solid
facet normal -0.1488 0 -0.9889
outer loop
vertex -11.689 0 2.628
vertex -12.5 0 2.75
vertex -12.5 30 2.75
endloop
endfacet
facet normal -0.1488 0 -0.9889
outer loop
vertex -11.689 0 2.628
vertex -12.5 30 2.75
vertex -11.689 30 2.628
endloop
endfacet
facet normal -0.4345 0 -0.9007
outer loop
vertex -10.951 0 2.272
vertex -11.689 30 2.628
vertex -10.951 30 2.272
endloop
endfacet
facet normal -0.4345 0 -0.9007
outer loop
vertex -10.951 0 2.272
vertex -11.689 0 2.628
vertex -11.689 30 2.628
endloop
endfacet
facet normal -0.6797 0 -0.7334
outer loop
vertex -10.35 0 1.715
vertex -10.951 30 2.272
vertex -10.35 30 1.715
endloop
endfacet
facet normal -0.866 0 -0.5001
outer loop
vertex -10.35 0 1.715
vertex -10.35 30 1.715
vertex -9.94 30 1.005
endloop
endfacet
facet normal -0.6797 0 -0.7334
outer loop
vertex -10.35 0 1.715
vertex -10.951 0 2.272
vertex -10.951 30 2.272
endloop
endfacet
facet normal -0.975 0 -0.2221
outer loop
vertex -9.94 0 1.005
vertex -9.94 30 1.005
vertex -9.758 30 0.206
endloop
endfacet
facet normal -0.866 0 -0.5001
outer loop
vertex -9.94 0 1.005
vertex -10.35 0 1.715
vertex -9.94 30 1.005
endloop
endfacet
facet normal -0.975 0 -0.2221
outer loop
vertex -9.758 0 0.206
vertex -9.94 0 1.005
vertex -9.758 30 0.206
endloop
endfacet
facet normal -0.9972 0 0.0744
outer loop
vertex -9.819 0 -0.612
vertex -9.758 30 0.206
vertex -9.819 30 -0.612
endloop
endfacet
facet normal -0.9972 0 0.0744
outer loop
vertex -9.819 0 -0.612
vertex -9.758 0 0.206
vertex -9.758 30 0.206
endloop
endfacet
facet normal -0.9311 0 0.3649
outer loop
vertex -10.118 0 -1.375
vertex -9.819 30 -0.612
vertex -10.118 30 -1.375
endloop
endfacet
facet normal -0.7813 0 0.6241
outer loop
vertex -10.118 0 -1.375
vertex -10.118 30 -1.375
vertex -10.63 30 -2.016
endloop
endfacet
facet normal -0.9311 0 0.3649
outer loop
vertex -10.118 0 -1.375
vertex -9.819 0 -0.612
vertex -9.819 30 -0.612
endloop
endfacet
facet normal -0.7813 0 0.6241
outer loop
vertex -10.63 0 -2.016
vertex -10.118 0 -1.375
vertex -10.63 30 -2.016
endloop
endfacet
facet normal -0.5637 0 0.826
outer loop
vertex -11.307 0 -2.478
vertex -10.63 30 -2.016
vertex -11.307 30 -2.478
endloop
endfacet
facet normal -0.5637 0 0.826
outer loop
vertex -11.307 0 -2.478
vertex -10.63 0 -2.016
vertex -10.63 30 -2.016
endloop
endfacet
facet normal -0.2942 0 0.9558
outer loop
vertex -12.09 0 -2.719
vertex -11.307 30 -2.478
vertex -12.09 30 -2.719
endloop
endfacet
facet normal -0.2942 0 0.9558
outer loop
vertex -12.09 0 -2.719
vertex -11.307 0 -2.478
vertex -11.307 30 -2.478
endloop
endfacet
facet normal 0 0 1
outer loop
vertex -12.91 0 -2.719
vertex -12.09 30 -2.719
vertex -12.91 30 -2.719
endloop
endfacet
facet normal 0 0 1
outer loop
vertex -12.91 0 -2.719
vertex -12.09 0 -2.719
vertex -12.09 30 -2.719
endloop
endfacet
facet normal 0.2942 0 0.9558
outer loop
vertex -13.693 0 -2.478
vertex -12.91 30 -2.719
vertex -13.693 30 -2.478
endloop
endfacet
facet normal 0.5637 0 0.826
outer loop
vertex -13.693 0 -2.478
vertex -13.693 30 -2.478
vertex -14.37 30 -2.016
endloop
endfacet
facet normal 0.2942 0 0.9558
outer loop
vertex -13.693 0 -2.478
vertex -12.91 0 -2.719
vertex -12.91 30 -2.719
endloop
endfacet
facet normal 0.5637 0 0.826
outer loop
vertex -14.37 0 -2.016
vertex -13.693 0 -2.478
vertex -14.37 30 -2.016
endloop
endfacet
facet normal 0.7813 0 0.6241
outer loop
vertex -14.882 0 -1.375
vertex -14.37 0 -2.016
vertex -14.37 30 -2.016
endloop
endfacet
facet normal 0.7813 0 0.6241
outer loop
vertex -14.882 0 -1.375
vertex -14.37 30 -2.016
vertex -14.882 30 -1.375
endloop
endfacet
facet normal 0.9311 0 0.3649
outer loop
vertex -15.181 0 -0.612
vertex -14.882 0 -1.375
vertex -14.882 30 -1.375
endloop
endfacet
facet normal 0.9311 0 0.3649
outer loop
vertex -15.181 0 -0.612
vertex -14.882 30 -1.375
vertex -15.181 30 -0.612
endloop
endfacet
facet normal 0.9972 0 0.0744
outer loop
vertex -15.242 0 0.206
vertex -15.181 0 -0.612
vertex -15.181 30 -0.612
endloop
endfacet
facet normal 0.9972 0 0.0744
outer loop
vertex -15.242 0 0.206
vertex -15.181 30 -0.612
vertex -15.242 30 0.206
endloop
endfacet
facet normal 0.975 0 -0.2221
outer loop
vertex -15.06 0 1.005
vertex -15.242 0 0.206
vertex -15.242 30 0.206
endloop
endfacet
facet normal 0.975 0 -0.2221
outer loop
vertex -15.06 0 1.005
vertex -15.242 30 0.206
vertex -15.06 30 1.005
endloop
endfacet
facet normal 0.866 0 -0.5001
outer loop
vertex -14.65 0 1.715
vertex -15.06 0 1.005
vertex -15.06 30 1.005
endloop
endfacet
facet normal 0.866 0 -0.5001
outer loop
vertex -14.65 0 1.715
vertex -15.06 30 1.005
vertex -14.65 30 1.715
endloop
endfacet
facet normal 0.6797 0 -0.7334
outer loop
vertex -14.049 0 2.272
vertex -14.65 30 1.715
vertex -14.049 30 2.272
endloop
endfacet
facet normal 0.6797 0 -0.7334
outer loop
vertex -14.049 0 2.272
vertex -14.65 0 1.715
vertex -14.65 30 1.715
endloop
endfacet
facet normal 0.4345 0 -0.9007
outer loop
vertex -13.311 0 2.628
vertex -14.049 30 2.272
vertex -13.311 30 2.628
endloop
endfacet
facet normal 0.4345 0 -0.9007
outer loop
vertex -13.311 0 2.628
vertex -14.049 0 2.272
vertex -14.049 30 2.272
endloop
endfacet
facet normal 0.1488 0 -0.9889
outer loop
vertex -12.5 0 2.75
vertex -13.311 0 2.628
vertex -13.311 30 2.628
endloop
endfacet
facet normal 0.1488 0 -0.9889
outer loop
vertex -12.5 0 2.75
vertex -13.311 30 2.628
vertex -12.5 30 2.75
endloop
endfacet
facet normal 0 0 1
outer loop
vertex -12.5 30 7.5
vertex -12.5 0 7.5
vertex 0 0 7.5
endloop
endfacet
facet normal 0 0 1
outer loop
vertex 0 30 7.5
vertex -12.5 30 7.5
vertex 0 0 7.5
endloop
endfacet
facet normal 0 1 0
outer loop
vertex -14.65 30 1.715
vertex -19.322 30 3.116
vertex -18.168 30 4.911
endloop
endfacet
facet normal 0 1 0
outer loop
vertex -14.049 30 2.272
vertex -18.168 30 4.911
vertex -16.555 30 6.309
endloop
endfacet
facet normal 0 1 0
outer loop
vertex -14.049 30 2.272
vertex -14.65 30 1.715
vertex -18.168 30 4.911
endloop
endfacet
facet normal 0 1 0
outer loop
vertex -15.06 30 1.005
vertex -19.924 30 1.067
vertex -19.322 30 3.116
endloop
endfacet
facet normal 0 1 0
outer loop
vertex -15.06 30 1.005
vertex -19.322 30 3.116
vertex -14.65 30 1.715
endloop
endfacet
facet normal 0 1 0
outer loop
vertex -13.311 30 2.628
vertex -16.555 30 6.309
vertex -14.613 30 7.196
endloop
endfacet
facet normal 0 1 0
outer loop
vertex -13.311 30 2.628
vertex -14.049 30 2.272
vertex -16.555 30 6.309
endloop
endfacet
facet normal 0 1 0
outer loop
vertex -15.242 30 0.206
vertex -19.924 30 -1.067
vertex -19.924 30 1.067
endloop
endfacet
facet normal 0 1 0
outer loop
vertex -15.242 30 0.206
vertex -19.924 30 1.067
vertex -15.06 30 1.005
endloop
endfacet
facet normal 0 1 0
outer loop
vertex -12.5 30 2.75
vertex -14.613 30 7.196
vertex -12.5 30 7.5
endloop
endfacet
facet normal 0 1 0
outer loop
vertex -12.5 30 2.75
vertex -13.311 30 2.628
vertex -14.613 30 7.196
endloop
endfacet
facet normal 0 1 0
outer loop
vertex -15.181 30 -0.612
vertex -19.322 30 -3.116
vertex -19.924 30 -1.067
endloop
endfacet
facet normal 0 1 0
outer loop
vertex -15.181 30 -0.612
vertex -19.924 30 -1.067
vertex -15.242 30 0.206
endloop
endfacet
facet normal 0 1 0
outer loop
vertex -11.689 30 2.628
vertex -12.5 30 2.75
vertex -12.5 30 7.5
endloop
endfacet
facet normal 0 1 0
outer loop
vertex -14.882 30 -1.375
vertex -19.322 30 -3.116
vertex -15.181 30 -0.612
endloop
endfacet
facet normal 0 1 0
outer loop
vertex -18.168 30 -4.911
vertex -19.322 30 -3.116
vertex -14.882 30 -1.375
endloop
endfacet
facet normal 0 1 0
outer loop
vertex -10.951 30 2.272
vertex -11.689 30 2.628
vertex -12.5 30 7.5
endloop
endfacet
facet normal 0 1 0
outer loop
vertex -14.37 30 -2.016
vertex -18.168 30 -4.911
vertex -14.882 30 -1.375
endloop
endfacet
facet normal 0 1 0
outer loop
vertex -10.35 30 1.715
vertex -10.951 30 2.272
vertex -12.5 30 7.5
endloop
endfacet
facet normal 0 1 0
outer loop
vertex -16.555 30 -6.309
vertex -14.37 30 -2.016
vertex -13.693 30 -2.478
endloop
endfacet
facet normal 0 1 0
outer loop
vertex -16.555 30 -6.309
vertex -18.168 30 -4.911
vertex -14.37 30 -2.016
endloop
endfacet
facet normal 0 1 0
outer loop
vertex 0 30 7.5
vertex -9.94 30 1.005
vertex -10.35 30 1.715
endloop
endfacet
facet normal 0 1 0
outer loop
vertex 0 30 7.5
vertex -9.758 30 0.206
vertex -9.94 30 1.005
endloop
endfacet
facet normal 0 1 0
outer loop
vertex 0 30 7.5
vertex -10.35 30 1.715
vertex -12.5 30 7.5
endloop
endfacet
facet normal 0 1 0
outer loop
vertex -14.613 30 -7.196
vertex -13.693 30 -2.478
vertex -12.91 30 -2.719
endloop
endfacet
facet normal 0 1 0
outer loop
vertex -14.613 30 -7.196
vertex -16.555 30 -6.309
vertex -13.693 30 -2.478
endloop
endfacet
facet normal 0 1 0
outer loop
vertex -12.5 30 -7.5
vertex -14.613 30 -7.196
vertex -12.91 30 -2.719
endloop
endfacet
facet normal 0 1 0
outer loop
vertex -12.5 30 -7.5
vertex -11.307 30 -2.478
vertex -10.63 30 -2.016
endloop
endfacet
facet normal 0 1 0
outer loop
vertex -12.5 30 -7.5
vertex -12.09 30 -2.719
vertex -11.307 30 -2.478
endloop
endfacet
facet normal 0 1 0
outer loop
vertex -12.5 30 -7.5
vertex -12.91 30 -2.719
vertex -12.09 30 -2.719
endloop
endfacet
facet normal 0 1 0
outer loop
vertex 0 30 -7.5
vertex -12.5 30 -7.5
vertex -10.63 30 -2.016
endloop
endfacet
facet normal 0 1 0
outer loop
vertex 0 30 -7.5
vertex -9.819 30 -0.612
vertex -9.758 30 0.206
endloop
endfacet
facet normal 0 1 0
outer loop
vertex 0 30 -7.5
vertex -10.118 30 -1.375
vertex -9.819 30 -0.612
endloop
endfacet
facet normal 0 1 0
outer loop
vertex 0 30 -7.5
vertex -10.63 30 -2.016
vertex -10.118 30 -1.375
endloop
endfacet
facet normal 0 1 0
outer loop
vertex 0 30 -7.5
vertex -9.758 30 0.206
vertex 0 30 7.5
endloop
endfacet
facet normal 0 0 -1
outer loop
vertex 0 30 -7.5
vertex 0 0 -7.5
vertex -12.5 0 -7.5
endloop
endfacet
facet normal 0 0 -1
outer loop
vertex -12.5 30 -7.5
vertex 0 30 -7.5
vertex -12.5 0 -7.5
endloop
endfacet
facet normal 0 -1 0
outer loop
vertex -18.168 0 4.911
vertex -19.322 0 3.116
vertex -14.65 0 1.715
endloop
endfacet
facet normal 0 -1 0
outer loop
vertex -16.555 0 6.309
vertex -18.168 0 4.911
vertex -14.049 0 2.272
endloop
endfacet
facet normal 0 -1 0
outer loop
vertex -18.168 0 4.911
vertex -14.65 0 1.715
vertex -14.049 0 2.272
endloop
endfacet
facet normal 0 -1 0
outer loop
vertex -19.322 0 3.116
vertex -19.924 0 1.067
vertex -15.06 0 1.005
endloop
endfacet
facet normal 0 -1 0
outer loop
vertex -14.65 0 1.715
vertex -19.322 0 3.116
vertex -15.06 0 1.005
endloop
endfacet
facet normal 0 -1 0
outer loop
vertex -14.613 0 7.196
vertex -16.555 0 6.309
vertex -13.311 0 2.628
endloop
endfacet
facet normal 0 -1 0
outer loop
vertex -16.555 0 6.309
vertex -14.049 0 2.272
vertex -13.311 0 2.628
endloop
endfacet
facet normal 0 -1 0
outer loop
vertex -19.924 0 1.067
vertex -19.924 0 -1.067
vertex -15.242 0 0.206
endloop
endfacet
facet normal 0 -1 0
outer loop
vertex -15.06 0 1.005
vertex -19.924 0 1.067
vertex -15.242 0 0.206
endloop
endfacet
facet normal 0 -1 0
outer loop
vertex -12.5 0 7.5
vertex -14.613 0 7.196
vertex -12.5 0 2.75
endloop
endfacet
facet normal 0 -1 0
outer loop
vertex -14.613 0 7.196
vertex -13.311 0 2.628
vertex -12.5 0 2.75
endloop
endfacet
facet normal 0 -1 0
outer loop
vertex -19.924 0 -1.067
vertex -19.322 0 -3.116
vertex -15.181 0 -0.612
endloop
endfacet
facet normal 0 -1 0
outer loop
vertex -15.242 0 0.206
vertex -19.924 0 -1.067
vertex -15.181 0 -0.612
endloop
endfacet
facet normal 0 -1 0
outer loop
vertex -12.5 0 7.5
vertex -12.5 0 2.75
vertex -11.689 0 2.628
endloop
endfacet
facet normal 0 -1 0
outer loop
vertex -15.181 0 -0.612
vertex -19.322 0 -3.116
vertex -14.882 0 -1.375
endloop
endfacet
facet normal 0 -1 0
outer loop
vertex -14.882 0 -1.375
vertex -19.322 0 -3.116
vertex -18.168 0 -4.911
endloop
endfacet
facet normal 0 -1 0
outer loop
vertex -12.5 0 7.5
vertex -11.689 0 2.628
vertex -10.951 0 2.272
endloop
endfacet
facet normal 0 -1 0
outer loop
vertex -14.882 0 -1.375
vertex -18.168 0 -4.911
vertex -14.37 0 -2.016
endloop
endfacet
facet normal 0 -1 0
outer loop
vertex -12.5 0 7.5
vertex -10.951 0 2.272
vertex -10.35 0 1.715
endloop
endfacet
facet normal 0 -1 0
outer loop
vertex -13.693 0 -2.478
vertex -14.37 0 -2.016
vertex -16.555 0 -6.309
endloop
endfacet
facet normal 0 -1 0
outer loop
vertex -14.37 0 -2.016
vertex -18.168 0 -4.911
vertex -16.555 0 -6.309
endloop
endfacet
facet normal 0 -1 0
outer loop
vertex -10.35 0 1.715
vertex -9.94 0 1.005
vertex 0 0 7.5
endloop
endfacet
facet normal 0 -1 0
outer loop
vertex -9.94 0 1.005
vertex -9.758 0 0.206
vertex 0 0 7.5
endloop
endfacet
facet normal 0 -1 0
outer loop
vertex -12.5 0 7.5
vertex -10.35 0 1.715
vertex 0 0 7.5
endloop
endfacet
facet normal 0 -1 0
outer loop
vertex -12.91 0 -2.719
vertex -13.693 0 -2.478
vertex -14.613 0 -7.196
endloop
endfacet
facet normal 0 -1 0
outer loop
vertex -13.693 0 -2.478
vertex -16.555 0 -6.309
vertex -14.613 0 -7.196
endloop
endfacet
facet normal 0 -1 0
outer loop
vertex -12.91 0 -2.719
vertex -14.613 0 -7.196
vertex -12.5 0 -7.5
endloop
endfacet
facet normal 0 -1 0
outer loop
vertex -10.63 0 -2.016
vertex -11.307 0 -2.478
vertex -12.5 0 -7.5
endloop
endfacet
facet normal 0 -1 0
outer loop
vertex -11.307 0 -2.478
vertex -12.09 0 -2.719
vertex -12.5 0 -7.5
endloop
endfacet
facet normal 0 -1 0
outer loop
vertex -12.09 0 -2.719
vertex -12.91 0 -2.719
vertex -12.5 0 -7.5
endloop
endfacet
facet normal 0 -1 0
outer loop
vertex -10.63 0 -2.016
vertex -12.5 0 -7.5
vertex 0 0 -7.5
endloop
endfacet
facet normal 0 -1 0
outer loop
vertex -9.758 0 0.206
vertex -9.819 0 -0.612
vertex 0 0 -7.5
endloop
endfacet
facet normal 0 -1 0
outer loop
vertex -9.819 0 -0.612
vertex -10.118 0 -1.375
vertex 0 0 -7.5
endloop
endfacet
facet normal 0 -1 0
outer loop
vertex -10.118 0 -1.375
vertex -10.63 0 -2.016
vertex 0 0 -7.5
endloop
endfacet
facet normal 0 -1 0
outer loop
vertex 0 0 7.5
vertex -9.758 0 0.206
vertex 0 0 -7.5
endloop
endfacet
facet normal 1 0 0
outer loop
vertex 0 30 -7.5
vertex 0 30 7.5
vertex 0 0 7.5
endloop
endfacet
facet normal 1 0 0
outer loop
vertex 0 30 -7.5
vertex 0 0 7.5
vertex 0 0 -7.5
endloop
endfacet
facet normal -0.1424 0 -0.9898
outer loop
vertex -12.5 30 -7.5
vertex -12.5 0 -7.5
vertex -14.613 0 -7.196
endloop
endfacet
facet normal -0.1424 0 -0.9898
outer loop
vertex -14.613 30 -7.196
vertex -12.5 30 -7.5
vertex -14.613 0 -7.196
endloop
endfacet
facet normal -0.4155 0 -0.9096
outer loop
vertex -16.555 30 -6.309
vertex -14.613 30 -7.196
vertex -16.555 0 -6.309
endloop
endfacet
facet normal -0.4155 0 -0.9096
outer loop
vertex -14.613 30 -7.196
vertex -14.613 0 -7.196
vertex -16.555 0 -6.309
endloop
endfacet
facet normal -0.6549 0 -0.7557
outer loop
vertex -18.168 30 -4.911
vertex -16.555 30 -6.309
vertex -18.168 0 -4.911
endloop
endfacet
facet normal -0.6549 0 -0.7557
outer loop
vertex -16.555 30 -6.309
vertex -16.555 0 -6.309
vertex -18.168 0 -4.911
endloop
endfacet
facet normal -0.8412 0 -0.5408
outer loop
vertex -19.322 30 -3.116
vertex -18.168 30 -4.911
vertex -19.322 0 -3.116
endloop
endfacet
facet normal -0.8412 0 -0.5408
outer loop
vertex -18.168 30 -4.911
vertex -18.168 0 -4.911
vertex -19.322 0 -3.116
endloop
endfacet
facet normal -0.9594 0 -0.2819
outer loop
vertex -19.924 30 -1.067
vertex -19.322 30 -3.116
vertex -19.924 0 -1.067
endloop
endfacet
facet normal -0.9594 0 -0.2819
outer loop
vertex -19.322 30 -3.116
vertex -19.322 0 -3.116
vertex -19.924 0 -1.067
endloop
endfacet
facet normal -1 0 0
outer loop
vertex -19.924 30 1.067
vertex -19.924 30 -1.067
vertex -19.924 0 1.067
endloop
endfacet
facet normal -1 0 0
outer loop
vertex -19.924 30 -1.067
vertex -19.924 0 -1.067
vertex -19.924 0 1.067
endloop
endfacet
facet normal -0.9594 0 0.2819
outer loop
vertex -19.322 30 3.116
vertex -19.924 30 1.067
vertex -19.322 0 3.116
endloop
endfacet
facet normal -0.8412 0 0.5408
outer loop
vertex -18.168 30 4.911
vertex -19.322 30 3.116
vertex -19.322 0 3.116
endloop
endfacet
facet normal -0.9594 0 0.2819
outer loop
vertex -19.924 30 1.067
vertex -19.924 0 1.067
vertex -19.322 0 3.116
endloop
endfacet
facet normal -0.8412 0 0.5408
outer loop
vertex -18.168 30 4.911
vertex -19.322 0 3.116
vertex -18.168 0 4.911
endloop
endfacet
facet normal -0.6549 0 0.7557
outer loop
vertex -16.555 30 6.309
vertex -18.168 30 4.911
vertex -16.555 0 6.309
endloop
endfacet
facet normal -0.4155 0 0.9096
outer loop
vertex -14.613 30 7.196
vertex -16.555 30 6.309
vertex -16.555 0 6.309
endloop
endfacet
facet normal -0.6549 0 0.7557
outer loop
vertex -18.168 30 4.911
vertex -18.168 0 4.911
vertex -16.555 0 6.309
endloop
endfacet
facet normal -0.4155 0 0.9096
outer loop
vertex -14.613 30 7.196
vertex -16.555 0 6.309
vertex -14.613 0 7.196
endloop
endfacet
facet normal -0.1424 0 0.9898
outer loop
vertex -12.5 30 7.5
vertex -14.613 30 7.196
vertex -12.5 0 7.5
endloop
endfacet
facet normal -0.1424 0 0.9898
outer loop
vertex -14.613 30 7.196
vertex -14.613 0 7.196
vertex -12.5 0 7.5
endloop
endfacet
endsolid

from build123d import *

# Parameters (mm, degrees)
SKETCH1_R           = 2.75
BOSS_EXTRUDE1_DEPTH = 30


with BuildPart() as part:
    # Sketch1 → Boss-Extrude1 (new body)
    with BuildSketch(Plane(origin=(0, 0, 0), x_dir=(1, 0, 0), z_dir=(0, 1, 0))):
        with BuildLine():
            Line((0, 7.5), (-12.5, 7.5))
            ThreePointArc((-12.5, 7.5), (-20, 0), (-12.5, -7.5))
            Line((-12.5, -7.5), (0, -7.5))
            Line((0, -7.5), (0, 7.5))
        make_face()
        with Locations(Location((-12.5, 0, 0), (0, 0, 270))):
            Circle(SKETCH1_R, mode=Mode.SUBTRACT)
    extrude(amount=BOSS_EXTRUDE1_DEPTH)


solid = part.part
